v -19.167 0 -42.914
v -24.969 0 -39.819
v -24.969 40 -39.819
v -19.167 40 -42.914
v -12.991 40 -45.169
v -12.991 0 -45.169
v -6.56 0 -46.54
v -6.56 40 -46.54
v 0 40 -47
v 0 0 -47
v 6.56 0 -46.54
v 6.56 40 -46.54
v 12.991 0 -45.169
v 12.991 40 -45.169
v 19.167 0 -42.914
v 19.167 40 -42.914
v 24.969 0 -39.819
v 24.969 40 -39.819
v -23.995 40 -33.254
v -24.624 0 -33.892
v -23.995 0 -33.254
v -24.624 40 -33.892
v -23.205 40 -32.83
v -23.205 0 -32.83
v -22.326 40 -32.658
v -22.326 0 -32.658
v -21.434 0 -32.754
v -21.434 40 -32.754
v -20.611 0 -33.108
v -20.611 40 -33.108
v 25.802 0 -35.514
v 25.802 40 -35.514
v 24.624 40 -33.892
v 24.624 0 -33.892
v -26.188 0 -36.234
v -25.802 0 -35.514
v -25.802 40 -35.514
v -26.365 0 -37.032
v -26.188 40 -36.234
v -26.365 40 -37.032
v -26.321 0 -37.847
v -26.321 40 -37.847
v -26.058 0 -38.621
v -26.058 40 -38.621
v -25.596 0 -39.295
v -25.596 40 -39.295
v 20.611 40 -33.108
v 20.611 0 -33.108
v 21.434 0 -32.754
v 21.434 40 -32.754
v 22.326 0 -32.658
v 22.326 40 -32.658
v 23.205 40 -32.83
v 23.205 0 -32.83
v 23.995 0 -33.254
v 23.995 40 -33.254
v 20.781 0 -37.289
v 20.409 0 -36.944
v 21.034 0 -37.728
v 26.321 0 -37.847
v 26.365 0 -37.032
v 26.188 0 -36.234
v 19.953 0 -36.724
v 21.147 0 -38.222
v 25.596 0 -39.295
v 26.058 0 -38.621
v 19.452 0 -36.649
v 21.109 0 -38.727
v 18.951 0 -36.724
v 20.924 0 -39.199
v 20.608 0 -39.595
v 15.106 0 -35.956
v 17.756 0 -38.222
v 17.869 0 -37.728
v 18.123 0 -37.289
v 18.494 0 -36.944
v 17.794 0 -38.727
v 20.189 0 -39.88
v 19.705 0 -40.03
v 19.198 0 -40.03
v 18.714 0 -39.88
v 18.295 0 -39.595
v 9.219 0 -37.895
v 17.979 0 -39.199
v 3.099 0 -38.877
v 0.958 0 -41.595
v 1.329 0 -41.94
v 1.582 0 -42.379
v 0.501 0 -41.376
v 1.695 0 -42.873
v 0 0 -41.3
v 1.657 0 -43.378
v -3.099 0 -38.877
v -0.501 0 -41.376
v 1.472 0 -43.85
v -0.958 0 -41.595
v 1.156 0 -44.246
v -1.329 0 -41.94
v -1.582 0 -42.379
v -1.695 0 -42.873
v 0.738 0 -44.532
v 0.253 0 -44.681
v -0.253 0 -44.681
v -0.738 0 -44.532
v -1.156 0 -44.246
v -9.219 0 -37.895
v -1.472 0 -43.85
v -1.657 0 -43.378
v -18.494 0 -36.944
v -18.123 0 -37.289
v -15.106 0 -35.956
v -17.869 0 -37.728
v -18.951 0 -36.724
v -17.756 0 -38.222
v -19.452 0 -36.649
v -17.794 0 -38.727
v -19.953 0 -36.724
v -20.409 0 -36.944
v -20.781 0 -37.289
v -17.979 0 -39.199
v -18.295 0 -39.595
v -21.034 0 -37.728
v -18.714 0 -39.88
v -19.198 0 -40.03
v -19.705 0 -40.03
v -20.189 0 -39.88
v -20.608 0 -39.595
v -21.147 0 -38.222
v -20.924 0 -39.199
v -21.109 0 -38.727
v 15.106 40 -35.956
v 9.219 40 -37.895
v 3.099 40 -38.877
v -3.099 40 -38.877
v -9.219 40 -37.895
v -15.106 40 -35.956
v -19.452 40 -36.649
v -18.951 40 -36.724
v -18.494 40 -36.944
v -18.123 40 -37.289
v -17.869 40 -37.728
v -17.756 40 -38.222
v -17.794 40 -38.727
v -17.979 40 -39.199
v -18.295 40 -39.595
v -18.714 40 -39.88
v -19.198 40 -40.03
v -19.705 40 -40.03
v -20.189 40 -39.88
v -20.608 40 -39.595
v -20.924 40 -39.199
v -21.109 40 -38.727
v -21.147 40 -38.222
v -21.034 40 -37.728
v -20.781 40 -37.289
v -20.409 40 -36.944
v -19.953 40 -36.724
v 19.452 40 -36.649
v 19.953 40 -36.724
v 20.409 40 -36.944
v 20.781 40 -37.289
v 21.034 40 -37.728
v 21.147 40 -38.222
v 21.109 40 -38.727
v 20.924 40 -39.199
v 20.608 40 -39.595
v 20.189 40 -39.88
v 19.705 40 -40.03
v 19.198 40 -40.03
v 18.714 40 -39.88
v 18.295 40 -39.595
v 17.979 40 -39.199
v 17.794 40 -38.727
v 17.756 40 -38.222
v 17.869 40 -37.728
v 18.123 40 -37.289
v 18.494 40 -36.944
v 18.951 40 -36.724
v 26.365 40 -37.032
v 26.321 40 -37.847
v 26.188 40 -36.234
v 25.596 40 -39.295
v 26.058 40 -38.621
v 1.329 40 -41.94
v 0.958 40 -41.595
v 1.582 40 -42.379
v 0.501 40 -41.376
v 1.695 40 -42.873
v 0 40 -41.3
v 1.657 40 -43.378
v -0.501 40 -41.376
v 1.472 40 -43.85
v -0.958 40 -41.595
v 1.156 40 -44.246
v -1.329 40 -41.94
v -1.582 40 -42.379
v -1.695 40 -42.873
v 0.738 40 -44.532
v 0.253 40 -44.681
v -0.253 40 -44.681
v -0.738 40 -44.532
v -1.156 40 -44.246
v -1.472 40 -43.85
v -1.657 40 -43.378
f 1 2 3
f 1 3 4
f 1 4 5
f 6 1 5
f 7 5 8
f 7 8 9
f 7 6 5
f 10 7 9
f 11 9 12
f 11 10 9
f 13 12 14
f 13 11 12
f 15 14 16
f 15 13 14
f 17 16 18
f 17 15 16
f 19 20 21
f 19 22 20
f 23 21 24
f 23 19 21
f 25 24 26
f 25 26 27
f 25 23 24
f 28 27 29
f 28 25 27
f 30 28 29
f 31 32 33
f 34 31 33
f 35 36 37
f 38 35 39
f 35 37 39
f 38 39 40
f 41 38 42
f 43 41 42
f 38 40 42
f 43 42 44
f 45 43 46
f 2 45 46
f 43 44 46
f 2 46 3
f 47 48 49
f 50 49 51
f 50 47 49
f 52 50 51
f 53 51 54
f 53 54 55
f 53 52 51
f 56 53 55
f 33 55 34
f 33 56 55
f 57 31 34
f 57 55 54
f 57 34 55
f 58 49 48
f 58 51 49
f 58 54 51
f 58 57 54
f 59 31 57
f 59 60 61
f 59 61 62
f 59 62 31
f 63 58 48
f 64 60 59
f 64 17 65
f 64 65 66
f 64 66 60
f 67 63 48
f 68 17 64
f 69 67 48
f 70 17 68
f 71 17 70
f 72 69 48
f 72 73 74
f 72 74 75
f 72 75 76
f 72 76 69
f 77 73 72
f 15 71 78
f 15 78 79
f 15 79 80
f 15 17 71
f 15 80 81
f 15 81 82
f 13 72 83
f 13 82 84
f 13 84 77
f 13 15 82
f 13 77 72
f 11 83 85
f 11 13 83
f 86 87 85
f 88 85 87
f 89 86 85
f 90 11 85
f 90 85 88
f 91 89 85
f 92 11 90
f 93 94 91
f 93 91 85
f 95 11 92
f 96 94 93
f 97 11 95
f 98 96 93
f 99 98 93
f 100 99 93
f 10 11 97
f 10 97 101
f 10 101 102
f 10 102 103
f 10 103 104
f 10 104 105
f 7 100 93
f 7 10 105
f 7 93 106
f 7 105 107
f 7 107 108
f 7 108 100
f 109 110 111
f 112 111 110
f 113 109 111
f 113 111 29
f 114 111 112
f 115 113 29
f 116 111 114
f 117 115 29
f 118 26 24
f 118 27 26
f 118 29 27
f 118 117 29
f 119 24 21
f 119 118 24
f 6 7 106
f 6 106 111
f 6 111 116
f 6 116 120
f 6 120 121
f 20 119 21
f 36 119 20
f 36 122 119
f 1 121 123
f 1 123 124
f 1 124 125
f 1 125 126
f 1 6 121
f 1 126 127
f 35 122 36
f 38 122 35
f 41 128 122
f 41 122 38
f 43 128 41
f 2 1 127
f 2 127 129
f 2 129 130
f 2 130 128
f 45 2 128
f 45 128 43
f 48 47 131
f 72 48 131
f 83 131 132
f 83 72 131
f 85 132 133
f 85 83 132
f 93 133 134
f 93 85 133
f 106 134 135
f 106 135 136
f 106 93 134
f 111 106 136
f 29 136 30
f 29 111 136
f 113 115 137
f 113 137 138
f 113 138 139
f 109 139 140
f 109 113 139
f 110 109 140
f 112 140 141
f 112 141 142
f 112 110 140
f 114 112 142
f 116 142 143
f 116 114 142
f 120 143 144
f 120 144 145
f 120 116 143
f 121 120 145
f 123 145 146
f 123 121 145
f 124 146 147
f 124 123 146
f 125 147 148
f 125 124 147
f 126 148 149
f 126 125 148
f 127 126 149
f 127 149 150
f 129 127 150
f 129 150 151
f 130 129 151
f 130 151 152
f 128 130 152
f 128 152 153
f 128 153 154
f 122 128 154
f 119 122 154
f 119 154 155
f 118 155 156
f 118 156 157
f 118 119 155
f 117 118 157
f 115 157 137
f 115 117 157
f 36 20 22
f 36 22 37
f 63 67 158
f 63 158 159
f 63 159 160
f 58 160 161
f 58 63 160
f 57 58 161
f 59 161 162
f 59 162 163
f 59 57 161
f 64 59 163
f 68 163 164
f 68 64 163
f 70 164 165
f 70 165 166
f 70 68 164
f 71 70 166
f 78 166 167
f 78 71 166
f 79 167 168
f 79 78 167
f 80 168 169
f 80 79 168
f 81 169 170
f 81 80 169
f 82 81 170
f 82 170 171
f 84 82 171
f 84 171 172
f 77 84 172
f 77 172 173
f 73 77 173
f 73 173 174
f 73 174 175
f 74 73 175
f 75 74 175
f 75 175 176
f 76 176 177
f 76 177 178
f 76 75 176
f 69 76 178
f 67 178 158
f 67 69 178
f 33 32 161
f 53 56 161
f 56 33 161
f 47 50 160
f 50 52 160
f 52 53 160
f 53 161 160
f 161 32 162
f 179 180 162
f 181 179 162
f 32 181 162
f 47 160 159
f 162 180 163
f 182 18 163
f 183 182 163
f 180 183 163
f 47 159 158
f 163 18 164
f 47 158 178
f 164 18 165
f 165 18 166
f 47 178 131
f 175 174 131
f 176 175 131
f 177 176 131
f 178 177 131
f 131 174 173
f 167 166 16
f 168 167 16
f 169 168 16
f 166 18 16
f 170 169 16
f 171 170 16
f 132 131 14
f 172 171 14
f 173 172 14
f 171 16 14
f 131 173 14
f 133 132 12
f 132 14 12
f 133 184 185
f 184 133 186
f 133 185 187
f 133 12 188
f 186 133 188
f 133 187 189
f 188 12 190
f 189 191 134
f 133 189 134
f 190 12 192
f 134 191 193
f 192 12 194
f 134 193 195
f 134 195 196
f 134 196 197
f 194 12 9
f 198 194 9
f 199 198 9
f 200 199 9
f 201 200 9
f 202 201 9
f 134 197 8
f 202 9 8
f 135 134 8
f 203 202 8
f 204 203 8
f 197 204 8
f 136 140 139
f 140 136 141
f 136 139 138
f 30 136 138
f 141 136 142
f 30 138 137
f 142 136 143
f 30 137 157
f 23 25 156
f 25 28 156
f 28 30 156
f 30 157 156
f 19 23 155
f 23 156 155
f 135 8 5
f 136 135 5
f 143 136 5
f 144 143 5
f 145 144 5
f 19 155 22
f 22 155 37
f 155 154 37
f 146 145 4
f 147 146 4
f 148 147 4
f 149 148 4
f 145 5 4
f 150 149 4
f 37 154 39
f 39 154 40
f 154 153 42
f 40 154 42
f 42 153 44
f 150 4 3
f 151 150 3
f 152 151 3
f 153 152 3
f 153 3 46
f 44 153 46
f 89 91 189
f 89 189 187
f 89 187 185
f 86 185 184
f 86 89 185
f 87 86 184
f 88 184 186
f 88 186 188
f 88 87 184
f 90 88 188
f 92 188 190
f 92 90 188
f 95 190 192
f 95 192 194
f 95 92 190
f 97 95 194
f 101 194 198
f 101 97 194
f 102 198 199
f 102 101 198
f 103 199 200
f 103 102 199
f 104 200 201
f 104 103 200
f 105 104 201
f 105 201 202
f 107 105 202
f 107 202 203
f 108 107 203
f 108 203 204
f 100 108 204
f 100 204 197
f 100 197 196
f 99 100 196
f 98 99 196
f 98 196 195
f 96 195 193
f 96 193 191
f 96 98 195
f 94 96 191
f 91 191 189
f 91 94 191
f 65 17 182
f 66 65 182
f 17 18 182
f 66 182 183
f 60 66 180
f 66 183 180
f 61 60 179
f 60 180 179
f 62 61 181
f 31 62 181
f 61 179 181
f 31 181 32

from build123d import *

# Parameters (mm, degrees)
SKETCH_1_R      = 1.7
EXTRUDE_1_DEPTH = 40
FILLET_1_R      = 3


with BuildPart() as part:
    # 草图1 → 凸台-拉伸1 (new body)
    with BuildSketch(Plane(origin=(0, 0, 0), x_dir=(1, 0, 0), z_dir=(0, 1, 0))):
        with BuildLine():
            Line((-22.923624839, 31.551662781), (-27.625906858, 38.023798736))
            ThreePointArc((-27.625906858, 38.023798736), (0, 47), (27.625906858, 38.023798736))
            Line((27.625906858, 38.023798736), (22.923624839, 31.551662781))
            ThreePointArc((22.923624839, 31.551662781), (0, 39), (-22.923624839, 31.551662781))
        make_face()
        with Locations(Location((0, 43, 0), (0, 0, 270))):
            Circle(SKETCH_1_R, mode=Mode.SUBTRACT)
        with Locations(Location((19.451649922, 38.348837209, 0), (0, 0, 270))):
            Circle(SKETCH_1_R, mode=Mode.SUBTRACT)
        with Locations(Location((-19.451649922, 38.348837209, 0), (0, 0, 270))):
            Circle(SKETCH_1_R, mode=Mode.SUBTRACT)
    extrude(amount=EXTRUDE_1_DEPTH)

    # 圆角1
    fillet_1_edges = [part.edges().sort_by_distance(p)[0] for p in [
        (-22.923624839, 20, -31.551662781),
        (-27.625906858, 20, -38.023798736),
        (27.625906858, 20, -38.023798736),
        (22.923624839, 20, -31.551662781),
    ]]
    fillet(fillet_1_edges, radius=FILLET_1_R)


solid = part.part
